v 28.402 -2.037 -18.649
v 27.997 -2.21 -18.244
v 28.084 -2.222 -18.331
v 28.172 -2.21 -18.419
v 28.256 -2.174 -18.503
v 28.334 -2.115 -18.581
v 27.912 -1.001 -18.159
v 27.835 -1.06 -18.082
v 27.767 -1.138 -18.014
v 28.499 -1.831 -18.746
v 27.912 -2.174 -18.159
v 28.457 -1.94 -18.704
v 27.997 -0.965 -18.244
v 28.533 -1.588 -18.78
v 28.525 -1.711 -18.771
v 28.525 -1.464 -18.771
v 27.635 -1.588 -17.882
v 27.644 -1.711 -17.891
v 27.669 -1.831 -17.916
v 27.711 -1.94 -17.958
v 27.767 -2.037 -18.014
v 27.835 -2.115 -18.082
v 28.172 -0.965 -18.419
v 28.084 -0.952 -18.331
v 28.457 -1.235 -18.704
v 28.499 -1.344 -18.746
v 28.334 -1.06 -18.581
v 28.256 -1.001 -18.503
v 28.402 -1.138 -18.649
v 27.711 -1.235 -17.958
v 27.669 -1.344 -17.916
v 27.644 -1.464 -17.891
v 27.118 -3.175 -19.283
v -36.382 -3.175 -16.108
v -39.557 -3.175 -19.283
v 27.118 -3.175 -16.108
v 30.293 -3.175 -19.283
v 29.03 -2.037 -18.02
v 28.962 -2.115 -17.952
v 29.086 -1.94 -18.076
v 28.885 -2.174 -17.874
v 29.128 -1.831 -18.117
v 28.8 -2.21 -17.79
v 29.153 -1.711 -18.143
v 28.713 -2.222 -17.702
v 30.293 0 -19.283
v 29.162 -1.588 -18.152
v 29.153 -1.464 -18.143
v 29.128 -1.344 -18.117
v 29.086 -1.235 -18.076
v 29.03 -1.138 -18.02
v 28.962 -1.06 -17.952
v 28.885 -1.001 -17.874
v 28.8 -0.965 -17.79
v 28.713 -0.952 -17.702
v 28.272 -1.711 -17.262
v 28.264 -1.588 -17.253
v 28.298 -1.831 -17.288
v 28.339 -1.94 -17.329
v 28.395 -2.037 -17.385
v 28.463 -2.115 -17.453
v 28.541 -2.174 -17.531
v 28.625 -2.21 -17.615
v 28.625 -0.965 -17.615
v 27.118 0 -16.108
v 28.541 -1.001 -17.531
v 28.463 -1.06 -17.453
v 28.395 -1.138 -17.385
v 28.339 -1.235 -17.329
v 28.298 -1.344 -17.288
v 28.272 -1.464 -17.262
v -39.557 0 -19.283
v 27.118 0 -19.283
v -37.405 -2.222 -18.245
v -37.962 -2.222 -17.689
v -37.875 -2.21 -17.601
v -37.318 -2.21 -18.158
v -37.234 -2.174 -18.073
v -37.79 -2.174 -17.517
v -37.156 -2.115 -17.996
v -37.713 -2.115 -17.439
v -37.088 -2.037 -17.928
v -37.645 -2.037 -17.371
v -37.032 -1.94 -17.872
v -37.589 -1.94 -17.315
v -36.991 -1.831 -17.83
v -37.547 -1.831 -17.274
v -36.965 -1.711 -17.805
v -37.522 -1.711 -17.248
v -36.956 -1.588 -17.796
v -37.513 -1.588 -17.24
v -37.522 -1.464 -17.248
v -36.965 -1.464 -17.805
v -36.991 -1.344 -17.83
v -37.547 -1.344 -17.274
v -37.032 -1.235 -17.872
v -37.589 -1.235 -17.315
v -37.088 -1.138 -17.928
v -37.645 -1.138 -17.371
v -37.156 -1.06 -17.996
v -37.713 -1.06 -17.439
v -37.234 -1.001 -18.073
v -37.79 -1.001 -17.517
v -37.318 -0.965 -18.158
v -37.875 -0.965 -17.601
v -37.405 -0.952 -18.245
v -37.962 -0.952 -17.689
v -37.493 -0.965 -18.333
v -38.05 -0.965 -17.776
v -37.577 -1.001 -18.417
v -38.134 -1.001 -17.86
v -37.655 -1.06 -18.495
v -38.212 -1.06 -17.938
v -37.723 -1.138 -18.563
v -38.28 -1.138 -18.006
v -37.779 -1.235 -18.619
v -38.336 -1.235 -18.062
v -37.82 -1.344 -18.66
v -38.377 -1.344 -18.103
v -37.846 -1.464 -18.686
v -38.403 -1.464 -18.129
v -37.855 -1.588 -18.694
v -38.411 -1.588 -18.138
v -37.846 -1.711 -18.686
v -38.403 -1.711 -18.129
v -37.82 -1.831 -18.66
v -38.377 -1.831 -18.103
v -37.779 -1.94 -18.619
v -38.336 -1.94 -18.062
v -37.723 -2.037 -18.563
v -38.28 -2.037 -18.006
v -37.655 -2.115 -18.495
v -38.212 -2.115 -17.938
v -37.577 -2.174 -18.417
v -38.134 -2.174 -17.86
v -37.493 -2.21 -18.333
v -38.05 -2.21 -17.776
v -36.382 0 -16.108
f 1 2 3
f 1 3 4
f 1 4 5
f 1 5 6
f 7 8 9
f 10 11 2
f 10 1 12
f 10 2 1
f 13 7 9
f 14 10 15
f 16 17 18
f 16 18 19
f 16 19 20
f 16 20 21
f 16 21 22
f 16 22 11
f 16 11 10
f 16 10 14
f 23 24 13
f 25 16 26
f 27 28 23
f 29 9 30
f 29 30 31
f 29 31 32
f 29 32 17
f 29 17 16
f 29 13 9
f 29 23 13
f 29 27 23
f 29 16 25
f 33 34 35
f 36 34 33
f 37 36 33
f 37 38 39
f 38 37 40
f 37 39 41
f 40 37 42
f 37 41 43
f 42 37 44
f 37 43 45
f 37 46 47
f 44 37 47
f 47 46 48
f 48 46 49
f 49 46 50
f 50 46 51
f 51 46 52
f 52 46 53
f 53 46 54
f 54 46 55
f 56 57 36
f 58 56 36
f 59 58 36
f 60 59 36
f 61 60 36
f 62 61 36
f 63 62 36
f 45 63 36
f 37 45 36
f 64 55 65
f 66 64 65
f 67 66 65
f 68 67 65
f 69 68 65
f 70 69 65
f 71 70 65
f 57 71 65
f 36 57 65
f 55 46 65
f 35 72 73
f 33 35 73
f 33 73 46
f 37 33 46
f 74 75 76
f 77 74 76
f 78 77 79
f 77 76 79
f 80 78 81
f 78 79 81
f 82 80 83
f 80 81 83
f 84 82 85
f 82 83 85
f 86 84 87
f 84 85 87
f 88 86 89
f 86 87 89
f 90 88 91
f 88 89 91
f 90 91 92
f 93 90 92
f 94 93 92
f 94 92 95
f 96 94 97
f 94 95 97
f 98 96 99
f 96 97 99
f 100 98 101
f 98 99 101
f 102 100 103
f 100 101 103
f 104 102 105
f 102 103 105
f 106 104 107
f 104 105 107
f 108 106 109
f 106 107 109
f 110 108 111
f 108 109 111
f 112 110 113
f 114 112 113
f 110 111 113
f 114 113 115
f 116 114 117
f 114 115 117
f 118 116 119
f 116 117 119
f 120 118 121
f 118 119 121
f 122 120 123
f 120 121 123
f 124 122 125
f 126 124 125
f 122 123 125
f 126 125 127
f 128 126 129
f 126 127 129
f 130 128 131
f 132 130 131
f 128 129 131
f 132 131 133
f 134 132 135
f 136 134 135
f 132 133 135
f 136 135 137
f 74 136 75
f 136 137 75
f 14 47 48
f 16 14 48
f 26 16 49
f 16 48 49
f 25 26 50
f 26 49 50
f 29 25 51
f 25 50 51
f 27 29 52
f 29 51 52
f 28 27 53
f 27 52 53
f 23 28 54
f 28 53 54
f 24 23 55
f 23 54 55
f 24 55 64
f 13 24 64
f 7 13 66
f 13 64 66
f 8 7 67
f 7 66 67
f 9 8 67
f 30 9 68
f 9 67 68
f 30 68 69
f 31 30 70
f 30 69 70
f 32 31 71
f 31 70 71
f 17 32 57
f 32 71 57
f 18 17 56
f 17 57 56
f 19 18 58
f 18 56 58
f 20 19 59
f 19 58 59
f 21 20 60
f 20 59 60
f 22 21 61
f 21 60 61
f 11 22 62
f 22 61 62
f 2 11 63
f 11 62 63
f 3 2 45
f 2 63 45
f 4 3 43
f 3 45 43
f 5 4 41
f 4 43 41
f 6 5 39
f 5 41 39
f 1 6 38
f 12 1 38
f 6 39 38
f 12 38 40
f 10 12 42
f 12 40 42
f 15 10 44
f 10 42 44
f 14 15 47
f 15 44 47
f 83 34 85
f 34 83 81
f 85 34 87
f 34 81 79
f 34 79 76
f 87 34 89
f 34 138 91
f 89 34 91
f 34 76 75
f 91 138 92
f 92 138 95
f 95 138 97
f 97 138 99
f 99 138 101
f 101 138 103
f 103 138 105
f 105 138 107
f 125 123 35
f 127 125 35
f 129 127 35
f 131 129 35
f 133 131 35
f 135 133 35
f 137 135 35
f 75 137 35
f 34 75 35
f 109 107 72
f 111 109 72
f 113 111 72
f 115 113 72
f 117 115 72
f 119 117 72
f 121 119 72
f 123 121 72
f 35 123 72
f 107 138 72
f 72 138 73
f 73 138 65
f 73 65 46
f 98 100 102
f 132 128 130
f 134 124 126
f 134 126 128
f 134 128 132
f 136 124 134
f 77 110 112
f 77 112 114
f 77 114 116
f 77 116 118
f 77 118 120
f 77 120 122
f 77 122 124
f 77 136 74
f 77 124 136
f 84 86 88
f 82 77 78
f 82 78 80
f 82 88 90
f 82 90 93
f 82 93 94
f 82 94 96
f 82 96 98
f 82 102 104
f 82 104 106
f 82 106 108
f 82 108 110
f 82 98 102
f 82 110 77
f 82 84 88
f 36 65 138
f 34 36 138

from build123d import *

# Parameters (mm, degrees)
F1_DEPTH = 3.175
F2_R     = 0.635
F3_DEPTH = 0.7874
F4_R     = 0.635
F5_DEPTH = 0.889


with BuildPart() as f1:
    # F0 (on Front) → F1 (new body)
    with BuildSketch(Plane.XZ):
        Polygon((-36.3817475656, -16.1080135742), (-39.5567475656, -19.2830135742), (27.1182524344, -19.2830135742), (27.1182524344, -16.1080135742), align=None)
        Polygon((27.1182524344, -16.1080135742), (27.1182524344, -19.2830135742), (30.293257907, -19.2830190468), align=None)
    extrude(amount=F1_DEPTH)

    # F2 (on face) → F3 (cut)
    with BuildSketch(Plane(origin=(-10.1368669957, 0, 10.1368669957), x_dir=(0, -1, 0), z_dir=(-0.7071067812, 0, 0.7071067812))):
        with Locations((1.5875, -39.3510660448)):
            Circle(F2_R)
    extrude(amount=-F3_DEPTH, mode=Mode.SUBTRACT)

    # F4 (on face) → F5 (cut)
    with BuildSketch(Plane(origin=(5.5051194301, 0, 5.5051194301), x_dir=(0.7071067812, 0, -0.7071067812), z_dir=(0.7071067812, 0, 0.7071067812))):
        with Locations((32.8205216201, -1.5875)):
            Circle(F4_R)
    extrude(amount=-F5_DEPTH, mode=Mode.SUBTRACT)


solid = f1.part
